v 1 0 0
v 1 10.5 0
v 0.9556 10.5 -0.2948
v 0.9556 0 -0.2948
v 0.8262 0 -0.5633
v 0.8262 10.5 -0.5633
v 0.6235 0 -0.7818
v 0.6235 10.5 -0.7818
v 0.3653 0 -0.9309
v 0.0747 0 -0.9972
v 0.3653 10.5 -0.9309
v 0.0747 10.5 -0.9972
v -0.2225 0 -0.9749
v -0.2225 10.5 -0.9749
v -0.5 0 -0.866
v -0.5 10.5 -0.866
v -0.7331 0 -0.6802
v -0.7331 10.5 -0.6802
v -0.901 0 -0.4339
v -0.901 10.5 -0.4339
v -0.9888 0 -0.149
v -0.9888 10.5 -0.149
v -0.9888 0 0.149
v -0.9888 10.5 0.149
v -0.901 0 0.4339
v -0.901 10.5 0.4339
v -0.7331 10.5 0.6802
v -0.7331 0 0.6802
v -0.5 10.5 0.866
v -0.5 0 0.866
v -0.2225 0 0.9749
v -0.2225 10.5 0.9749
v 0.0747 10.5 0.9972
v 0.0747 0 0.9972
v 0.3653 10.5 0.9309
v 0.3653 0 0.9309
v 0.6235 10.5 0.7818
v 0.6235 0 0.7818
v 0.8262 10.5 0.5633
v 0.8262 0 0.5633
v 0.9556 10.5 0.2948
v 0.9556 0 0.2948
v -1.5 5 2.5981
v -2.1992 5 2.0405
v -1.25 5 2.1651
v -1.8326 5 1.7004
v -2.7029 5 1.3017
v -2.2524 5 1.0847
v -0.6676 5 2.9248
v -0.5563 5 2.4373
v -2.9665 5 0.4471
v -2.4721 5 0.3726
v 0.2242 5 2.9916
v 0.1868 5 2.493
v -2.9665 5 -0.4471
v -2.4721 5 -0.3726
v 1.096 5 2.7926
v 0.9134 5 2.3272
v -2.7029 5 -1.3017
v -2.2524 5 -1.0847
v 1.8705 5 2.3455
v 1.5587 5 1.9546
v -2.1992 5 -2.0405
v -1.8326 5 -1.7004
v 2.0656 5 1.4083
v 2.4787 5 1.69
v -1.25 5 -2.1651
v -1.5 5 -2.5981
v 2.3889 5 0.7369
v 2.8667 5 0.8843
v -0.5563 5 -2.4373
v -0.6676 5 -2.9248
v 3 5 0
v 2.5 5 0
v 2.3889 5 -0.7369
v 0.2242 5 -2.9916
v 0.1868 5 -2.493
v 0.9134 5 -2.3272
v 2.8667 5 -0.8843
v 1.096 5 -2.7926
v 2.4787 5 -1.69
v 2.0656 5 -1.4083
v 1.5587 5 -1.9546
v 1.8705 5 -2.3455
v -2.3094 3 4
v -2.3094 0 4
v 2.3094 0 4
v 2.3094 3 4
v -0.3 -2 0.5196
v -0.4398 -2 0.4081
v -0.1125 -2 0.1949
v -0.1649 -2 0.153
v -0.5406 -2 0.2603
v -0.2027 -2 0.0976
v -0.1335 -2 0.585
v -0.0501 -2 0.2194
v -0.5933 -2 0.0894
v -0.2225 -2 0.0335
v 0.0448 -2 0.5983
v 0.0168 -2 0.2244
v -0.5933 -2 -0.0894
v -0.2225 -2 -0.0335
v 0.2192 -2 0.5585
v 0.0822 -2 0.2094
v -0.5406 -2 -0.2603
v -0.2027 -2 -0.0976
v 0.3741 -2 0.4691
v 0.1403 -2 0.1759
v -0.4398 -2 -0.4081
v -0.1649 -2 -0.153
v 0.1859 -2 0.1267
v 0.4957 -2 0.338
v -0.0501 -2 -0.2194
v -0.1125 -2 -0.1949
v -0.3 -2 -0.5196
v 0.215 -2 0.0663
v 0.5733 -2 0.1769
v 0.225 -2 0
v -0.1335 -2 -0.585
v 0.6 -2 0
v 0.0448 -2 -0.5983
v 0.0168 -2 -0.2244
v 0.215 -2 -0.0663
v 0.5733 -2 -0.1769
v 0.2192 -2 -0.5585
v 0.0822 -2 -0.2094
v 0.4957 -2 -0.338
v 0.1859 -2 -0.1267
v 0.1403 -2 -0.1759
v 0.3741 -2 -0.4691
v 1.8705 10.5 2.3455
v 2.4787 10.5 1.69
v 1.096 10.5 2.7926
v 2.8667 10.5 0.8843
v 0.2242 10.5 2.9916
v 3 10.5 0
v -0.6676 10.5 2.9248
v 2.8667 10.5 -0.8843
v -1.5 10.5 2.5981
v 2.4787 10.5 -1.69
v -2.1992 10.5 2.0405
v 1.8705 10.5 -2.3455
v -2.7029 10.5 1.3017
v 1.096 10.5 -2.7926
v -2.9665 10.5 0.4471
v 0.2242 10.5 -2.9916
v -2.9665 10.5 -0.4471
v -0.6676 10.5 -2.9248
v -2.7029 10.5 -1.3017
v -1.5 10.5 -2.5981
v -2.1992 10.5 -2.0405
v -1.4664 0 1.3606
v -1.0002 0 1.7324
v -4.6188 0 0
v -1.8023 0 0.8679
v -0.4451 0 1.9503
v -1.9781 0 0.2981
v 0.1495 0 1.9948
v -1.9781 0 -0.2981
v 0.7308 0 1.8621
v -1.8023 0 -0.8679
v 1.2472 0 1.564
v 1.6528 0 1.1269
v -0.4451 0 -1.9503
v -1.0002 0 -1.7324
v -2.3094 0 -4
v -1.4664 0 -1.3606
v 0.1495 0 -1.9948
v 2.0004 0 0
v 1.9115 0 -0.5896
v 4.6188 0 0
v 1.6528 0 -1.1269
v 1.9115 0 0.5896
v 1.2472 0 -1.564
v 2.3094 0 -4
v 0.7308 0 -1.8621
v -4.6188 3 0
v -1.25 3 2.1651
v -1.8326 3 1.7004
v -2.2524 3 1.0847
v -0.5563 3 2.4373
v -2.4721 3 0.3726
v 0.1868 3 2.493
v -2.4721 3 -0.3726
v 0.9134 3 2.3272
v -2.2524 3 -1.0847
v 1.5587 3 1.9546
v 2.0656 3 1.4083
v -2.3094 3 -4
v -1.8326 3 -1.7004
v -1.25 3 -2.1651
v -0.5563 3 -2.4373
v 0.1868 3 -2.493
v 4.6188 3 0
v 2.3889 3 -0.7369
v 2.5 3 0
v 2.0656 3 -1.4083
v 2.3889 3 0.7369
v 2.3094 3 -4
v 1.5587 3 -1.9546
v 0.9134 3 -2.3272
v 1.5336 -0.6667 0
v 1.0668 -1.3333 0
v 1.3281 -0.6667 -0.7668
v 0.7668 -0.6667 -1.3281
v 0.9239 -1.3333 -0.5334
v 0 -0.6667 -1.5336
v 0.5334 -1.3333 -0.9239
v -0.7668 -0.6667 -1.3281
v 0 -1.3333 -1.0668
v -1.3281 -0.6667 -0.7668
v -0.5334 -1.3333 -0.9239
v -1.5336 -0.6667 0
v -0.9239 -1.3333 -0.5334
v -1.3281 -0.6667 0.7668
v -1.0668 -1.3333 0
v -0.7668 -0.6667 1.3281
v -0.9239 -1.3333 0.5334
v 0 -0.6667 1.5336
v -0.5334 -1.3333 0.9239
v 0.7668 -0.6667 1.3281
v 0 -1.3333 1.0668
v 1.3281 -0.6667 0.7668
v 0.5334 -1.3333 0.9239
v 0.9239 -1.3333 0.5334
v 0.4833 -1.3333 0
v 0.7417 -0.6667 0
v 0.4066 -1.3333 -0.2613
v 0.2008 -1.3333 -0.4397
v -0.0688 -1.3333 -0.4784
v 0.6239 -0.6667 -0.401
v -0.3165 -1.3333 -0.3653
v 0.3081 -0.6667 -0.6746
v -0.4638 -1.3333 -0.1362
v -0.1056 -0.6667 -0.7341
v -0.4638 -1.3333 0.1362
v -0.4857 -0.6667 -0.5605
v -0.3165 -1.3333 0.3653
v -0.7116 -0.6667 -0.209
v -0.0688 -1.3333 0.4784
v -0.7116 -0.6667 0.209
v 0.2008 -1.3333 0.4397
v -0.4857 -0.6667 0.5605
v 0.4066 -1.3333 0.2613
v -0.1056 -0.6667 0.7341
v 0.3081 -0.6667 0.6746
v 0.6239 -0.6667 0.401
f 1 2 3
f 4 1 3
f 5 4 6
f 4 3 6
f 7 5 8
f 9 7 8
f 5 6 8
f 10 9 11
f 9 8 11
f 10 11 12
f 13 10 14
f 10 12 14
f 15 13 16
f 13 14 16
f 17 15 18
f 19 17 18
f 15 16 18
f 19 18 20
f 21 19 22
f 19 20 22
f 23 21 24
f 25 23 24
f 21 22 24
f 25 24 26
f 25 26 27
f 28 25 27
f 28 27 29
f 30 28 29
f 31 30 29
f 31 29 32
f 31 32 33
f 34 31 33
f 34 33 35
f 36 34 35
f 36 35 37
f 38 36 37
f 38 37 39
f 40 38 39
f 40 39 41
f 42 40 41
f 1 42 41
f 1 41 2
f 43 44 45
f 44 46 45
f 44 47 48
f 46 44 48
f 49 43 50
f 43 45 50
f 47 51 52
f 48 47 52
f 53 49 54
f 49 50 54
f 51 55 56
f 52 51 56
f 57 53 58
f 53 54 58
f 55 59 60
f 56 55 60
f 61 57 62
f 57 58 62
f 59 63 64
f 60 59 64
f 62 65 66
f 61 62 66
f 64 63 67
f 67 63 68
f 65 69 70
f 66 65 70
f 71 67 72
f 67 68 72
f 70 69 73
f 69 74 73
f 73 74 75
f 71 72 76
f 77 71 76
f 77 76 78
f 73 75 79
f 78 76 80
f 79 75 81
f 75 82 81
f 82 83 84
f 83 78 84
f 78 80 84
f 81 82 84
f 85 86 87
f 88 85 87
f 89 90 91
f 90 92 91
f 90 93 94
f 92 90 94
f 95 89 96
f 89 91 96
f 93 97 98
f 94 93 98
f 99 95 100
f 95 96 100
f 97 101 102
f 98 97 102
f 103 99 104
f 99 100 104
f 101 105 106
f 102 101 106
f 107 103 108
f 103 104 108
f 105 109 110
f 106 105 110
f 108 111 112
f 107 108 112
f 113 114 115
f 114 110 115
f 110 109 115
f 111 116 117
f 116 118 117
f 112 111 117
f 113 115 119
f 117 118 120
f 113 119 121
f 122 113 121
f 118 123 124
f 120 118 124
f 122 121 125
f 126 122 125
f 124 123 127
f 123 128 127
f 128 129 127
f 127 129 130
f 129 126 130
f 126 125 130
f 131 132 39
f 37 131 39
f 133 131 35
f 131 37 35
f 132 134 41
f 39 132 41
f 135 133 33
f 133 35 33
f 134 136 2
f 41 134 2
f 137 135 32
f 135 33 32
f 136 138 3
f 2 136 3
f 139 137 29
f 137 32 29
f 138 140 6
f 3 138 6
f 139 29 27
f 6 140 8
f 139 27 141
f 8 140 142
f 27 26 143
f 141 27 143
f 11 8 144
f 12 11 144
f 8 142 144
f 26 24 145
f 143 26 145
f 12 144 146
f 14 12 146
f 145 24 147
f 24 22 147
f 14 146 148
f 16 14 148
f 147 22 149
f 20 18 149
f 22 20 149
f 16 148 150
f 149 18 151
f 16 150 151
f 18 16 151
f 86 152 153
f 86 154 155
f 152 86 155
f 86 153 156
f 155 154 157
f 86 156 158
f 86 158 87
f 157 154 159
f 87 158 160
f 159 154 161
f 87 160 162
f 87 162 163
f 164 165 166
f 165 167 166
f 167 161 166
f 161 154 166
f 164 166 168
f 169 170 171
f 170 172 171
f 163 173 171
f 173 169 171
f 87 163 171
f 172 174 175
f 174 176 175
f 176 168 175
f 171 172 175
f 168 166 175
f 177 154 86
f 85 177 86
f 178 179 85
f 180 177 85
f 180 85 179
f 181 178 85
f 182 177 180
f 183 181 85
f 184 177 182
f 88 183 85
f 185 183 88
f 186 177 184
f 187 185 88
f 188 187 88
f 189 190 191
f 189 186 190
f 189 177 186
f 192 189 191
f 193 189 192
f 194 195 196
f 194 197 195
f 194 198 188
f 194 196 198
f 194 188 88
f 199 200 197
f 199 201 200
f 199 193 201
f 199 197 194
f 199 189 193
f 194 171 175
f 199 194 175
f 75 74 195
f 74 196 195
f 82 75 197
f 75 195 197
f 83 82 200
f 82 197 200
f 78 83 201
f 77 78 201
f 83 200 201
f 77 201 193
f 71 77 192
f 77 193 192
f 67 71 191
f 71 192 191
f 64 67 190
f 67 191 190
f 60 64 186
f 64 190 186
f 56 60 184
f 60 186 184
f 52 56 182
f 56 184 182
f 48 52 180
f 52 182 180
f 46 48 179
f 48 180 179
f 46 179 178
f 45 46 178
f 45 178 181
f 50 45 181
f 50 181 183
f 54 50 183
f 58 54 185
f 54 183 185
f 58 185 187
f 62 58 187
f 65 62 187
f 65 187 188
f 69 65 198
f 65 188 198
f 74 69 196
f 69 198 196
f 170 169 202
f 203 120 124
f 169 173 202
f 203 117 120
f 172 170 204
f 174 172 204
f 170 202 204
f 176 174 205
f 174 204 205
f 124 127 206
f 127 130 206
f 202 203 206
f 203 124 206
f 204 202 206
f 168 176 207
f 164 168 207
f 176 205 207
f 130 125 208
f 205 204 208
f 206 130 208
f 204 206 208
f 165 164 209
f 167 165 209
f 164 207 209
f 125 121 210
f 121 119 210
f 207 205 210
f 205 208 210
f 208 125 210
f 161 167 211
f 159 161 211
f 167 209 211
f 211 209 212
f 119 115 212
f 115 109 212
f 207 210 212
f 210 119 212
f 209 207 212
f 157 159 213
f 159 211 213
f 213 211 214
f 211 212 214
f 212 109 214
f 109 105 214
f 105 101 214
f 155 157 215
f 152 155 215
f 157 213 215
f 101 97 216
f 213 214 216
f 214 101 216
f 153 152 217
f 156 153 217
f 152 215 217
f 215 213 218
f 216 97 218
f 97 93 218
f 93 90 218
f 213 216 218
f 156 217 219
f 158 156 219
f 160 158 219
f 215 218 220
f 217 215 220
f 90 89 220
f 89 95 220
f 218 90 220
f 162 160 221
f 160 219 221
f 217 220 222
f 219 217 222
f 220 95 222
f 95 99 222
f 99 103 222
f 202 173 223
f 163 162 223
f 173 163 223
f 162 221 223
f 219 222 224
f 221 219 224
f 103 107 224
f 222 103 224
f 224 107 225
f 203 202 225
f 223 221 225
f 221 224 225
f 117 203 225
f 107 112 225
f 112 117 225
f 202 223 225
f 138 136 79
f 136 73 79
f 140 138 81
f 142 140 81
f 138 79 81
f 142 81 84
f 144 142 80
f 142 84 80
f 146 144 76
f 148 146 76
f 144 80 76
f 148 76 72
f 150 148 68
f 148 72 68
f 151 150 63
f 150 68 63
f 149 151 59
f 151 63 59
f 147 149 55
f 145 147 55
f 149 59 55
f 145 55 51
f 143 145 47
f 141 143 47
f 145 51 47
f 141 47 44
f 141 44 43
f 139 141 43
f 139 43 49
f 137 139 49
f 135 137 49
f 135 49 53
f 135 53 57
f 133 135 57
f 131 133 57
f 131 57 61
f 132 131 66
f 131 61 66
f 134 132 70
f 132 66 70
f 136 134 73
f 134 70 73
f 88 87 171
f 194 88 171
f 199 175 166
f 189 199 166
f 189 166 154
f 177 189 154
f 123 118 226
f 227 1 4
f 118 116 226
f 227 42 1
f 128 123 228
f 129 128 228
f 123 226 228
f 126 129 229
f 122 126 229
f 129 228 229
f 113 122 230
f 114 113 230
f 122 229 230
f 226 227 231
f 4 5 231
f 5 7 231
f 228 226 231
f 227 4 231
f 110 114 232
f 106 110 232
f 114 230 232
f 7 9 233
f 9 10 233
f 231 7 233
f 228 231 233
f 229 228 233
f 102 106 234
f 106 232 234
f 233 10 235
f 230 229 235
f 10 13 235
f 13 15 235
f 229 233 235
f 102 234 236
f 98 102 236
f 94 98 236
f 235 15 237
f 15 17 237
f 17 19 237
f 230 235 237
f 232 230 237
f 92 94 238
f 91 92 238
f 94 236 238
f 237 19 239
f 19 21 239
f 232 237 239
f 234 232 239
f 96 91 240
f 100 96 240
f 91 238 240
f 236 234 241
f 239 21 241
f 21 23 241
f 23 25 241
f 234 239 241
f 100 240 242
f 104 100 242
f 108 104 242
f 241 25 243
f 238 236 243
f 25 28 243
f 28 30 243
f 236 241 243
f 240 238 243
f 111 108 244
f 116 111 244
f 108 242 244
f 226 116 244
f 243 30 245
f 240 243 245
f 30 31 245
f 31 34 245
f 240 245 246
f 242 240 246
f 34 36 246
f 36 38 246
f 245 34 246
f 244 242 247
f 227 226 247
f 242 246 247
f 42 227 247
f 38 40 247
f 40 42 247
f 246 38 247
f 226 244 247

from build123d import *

# Parameters (mm, degrees)
SKETCH1_R           = 1
BOSS_EXTRUDE1_DEPTH = 3


with BuildPart() as part:
    # Sketch1 → Boss-Extrude1 (new body)
    with BuildSketch(Plane(origin=(0, 0, 0), x_dir=(1, 0, 0), z_dir=(0, 1, 0))):
        Polygon((2.309401077, 4), (-2.309401077, 4), (-4.618802154, 0), (-2.309401077, -4), (2.309401077, -4), (4.618802154, 0), align=None)
        Circle(SKETCH1_R, mode=Mode.SUBTRACT)
    extrude(amount=BOSS_EXTRUDE1_DEPTH)

    # Sketch2 → Revolve1 (revolve)
    with BuildSketch(Plane.XY):
        Polygon((2.5, 3), (1, 3), (1, 10.5), (3, 10.5), (3, 5), (2.5, 5), align=None)
        Polygon((1, 0), (2.000415076, 0), (0.6, -2), (0.225, -2), align=None)
    revolve(axis=Axis((0, -2, 0), (0, 1, 0)))


solid = part.part
